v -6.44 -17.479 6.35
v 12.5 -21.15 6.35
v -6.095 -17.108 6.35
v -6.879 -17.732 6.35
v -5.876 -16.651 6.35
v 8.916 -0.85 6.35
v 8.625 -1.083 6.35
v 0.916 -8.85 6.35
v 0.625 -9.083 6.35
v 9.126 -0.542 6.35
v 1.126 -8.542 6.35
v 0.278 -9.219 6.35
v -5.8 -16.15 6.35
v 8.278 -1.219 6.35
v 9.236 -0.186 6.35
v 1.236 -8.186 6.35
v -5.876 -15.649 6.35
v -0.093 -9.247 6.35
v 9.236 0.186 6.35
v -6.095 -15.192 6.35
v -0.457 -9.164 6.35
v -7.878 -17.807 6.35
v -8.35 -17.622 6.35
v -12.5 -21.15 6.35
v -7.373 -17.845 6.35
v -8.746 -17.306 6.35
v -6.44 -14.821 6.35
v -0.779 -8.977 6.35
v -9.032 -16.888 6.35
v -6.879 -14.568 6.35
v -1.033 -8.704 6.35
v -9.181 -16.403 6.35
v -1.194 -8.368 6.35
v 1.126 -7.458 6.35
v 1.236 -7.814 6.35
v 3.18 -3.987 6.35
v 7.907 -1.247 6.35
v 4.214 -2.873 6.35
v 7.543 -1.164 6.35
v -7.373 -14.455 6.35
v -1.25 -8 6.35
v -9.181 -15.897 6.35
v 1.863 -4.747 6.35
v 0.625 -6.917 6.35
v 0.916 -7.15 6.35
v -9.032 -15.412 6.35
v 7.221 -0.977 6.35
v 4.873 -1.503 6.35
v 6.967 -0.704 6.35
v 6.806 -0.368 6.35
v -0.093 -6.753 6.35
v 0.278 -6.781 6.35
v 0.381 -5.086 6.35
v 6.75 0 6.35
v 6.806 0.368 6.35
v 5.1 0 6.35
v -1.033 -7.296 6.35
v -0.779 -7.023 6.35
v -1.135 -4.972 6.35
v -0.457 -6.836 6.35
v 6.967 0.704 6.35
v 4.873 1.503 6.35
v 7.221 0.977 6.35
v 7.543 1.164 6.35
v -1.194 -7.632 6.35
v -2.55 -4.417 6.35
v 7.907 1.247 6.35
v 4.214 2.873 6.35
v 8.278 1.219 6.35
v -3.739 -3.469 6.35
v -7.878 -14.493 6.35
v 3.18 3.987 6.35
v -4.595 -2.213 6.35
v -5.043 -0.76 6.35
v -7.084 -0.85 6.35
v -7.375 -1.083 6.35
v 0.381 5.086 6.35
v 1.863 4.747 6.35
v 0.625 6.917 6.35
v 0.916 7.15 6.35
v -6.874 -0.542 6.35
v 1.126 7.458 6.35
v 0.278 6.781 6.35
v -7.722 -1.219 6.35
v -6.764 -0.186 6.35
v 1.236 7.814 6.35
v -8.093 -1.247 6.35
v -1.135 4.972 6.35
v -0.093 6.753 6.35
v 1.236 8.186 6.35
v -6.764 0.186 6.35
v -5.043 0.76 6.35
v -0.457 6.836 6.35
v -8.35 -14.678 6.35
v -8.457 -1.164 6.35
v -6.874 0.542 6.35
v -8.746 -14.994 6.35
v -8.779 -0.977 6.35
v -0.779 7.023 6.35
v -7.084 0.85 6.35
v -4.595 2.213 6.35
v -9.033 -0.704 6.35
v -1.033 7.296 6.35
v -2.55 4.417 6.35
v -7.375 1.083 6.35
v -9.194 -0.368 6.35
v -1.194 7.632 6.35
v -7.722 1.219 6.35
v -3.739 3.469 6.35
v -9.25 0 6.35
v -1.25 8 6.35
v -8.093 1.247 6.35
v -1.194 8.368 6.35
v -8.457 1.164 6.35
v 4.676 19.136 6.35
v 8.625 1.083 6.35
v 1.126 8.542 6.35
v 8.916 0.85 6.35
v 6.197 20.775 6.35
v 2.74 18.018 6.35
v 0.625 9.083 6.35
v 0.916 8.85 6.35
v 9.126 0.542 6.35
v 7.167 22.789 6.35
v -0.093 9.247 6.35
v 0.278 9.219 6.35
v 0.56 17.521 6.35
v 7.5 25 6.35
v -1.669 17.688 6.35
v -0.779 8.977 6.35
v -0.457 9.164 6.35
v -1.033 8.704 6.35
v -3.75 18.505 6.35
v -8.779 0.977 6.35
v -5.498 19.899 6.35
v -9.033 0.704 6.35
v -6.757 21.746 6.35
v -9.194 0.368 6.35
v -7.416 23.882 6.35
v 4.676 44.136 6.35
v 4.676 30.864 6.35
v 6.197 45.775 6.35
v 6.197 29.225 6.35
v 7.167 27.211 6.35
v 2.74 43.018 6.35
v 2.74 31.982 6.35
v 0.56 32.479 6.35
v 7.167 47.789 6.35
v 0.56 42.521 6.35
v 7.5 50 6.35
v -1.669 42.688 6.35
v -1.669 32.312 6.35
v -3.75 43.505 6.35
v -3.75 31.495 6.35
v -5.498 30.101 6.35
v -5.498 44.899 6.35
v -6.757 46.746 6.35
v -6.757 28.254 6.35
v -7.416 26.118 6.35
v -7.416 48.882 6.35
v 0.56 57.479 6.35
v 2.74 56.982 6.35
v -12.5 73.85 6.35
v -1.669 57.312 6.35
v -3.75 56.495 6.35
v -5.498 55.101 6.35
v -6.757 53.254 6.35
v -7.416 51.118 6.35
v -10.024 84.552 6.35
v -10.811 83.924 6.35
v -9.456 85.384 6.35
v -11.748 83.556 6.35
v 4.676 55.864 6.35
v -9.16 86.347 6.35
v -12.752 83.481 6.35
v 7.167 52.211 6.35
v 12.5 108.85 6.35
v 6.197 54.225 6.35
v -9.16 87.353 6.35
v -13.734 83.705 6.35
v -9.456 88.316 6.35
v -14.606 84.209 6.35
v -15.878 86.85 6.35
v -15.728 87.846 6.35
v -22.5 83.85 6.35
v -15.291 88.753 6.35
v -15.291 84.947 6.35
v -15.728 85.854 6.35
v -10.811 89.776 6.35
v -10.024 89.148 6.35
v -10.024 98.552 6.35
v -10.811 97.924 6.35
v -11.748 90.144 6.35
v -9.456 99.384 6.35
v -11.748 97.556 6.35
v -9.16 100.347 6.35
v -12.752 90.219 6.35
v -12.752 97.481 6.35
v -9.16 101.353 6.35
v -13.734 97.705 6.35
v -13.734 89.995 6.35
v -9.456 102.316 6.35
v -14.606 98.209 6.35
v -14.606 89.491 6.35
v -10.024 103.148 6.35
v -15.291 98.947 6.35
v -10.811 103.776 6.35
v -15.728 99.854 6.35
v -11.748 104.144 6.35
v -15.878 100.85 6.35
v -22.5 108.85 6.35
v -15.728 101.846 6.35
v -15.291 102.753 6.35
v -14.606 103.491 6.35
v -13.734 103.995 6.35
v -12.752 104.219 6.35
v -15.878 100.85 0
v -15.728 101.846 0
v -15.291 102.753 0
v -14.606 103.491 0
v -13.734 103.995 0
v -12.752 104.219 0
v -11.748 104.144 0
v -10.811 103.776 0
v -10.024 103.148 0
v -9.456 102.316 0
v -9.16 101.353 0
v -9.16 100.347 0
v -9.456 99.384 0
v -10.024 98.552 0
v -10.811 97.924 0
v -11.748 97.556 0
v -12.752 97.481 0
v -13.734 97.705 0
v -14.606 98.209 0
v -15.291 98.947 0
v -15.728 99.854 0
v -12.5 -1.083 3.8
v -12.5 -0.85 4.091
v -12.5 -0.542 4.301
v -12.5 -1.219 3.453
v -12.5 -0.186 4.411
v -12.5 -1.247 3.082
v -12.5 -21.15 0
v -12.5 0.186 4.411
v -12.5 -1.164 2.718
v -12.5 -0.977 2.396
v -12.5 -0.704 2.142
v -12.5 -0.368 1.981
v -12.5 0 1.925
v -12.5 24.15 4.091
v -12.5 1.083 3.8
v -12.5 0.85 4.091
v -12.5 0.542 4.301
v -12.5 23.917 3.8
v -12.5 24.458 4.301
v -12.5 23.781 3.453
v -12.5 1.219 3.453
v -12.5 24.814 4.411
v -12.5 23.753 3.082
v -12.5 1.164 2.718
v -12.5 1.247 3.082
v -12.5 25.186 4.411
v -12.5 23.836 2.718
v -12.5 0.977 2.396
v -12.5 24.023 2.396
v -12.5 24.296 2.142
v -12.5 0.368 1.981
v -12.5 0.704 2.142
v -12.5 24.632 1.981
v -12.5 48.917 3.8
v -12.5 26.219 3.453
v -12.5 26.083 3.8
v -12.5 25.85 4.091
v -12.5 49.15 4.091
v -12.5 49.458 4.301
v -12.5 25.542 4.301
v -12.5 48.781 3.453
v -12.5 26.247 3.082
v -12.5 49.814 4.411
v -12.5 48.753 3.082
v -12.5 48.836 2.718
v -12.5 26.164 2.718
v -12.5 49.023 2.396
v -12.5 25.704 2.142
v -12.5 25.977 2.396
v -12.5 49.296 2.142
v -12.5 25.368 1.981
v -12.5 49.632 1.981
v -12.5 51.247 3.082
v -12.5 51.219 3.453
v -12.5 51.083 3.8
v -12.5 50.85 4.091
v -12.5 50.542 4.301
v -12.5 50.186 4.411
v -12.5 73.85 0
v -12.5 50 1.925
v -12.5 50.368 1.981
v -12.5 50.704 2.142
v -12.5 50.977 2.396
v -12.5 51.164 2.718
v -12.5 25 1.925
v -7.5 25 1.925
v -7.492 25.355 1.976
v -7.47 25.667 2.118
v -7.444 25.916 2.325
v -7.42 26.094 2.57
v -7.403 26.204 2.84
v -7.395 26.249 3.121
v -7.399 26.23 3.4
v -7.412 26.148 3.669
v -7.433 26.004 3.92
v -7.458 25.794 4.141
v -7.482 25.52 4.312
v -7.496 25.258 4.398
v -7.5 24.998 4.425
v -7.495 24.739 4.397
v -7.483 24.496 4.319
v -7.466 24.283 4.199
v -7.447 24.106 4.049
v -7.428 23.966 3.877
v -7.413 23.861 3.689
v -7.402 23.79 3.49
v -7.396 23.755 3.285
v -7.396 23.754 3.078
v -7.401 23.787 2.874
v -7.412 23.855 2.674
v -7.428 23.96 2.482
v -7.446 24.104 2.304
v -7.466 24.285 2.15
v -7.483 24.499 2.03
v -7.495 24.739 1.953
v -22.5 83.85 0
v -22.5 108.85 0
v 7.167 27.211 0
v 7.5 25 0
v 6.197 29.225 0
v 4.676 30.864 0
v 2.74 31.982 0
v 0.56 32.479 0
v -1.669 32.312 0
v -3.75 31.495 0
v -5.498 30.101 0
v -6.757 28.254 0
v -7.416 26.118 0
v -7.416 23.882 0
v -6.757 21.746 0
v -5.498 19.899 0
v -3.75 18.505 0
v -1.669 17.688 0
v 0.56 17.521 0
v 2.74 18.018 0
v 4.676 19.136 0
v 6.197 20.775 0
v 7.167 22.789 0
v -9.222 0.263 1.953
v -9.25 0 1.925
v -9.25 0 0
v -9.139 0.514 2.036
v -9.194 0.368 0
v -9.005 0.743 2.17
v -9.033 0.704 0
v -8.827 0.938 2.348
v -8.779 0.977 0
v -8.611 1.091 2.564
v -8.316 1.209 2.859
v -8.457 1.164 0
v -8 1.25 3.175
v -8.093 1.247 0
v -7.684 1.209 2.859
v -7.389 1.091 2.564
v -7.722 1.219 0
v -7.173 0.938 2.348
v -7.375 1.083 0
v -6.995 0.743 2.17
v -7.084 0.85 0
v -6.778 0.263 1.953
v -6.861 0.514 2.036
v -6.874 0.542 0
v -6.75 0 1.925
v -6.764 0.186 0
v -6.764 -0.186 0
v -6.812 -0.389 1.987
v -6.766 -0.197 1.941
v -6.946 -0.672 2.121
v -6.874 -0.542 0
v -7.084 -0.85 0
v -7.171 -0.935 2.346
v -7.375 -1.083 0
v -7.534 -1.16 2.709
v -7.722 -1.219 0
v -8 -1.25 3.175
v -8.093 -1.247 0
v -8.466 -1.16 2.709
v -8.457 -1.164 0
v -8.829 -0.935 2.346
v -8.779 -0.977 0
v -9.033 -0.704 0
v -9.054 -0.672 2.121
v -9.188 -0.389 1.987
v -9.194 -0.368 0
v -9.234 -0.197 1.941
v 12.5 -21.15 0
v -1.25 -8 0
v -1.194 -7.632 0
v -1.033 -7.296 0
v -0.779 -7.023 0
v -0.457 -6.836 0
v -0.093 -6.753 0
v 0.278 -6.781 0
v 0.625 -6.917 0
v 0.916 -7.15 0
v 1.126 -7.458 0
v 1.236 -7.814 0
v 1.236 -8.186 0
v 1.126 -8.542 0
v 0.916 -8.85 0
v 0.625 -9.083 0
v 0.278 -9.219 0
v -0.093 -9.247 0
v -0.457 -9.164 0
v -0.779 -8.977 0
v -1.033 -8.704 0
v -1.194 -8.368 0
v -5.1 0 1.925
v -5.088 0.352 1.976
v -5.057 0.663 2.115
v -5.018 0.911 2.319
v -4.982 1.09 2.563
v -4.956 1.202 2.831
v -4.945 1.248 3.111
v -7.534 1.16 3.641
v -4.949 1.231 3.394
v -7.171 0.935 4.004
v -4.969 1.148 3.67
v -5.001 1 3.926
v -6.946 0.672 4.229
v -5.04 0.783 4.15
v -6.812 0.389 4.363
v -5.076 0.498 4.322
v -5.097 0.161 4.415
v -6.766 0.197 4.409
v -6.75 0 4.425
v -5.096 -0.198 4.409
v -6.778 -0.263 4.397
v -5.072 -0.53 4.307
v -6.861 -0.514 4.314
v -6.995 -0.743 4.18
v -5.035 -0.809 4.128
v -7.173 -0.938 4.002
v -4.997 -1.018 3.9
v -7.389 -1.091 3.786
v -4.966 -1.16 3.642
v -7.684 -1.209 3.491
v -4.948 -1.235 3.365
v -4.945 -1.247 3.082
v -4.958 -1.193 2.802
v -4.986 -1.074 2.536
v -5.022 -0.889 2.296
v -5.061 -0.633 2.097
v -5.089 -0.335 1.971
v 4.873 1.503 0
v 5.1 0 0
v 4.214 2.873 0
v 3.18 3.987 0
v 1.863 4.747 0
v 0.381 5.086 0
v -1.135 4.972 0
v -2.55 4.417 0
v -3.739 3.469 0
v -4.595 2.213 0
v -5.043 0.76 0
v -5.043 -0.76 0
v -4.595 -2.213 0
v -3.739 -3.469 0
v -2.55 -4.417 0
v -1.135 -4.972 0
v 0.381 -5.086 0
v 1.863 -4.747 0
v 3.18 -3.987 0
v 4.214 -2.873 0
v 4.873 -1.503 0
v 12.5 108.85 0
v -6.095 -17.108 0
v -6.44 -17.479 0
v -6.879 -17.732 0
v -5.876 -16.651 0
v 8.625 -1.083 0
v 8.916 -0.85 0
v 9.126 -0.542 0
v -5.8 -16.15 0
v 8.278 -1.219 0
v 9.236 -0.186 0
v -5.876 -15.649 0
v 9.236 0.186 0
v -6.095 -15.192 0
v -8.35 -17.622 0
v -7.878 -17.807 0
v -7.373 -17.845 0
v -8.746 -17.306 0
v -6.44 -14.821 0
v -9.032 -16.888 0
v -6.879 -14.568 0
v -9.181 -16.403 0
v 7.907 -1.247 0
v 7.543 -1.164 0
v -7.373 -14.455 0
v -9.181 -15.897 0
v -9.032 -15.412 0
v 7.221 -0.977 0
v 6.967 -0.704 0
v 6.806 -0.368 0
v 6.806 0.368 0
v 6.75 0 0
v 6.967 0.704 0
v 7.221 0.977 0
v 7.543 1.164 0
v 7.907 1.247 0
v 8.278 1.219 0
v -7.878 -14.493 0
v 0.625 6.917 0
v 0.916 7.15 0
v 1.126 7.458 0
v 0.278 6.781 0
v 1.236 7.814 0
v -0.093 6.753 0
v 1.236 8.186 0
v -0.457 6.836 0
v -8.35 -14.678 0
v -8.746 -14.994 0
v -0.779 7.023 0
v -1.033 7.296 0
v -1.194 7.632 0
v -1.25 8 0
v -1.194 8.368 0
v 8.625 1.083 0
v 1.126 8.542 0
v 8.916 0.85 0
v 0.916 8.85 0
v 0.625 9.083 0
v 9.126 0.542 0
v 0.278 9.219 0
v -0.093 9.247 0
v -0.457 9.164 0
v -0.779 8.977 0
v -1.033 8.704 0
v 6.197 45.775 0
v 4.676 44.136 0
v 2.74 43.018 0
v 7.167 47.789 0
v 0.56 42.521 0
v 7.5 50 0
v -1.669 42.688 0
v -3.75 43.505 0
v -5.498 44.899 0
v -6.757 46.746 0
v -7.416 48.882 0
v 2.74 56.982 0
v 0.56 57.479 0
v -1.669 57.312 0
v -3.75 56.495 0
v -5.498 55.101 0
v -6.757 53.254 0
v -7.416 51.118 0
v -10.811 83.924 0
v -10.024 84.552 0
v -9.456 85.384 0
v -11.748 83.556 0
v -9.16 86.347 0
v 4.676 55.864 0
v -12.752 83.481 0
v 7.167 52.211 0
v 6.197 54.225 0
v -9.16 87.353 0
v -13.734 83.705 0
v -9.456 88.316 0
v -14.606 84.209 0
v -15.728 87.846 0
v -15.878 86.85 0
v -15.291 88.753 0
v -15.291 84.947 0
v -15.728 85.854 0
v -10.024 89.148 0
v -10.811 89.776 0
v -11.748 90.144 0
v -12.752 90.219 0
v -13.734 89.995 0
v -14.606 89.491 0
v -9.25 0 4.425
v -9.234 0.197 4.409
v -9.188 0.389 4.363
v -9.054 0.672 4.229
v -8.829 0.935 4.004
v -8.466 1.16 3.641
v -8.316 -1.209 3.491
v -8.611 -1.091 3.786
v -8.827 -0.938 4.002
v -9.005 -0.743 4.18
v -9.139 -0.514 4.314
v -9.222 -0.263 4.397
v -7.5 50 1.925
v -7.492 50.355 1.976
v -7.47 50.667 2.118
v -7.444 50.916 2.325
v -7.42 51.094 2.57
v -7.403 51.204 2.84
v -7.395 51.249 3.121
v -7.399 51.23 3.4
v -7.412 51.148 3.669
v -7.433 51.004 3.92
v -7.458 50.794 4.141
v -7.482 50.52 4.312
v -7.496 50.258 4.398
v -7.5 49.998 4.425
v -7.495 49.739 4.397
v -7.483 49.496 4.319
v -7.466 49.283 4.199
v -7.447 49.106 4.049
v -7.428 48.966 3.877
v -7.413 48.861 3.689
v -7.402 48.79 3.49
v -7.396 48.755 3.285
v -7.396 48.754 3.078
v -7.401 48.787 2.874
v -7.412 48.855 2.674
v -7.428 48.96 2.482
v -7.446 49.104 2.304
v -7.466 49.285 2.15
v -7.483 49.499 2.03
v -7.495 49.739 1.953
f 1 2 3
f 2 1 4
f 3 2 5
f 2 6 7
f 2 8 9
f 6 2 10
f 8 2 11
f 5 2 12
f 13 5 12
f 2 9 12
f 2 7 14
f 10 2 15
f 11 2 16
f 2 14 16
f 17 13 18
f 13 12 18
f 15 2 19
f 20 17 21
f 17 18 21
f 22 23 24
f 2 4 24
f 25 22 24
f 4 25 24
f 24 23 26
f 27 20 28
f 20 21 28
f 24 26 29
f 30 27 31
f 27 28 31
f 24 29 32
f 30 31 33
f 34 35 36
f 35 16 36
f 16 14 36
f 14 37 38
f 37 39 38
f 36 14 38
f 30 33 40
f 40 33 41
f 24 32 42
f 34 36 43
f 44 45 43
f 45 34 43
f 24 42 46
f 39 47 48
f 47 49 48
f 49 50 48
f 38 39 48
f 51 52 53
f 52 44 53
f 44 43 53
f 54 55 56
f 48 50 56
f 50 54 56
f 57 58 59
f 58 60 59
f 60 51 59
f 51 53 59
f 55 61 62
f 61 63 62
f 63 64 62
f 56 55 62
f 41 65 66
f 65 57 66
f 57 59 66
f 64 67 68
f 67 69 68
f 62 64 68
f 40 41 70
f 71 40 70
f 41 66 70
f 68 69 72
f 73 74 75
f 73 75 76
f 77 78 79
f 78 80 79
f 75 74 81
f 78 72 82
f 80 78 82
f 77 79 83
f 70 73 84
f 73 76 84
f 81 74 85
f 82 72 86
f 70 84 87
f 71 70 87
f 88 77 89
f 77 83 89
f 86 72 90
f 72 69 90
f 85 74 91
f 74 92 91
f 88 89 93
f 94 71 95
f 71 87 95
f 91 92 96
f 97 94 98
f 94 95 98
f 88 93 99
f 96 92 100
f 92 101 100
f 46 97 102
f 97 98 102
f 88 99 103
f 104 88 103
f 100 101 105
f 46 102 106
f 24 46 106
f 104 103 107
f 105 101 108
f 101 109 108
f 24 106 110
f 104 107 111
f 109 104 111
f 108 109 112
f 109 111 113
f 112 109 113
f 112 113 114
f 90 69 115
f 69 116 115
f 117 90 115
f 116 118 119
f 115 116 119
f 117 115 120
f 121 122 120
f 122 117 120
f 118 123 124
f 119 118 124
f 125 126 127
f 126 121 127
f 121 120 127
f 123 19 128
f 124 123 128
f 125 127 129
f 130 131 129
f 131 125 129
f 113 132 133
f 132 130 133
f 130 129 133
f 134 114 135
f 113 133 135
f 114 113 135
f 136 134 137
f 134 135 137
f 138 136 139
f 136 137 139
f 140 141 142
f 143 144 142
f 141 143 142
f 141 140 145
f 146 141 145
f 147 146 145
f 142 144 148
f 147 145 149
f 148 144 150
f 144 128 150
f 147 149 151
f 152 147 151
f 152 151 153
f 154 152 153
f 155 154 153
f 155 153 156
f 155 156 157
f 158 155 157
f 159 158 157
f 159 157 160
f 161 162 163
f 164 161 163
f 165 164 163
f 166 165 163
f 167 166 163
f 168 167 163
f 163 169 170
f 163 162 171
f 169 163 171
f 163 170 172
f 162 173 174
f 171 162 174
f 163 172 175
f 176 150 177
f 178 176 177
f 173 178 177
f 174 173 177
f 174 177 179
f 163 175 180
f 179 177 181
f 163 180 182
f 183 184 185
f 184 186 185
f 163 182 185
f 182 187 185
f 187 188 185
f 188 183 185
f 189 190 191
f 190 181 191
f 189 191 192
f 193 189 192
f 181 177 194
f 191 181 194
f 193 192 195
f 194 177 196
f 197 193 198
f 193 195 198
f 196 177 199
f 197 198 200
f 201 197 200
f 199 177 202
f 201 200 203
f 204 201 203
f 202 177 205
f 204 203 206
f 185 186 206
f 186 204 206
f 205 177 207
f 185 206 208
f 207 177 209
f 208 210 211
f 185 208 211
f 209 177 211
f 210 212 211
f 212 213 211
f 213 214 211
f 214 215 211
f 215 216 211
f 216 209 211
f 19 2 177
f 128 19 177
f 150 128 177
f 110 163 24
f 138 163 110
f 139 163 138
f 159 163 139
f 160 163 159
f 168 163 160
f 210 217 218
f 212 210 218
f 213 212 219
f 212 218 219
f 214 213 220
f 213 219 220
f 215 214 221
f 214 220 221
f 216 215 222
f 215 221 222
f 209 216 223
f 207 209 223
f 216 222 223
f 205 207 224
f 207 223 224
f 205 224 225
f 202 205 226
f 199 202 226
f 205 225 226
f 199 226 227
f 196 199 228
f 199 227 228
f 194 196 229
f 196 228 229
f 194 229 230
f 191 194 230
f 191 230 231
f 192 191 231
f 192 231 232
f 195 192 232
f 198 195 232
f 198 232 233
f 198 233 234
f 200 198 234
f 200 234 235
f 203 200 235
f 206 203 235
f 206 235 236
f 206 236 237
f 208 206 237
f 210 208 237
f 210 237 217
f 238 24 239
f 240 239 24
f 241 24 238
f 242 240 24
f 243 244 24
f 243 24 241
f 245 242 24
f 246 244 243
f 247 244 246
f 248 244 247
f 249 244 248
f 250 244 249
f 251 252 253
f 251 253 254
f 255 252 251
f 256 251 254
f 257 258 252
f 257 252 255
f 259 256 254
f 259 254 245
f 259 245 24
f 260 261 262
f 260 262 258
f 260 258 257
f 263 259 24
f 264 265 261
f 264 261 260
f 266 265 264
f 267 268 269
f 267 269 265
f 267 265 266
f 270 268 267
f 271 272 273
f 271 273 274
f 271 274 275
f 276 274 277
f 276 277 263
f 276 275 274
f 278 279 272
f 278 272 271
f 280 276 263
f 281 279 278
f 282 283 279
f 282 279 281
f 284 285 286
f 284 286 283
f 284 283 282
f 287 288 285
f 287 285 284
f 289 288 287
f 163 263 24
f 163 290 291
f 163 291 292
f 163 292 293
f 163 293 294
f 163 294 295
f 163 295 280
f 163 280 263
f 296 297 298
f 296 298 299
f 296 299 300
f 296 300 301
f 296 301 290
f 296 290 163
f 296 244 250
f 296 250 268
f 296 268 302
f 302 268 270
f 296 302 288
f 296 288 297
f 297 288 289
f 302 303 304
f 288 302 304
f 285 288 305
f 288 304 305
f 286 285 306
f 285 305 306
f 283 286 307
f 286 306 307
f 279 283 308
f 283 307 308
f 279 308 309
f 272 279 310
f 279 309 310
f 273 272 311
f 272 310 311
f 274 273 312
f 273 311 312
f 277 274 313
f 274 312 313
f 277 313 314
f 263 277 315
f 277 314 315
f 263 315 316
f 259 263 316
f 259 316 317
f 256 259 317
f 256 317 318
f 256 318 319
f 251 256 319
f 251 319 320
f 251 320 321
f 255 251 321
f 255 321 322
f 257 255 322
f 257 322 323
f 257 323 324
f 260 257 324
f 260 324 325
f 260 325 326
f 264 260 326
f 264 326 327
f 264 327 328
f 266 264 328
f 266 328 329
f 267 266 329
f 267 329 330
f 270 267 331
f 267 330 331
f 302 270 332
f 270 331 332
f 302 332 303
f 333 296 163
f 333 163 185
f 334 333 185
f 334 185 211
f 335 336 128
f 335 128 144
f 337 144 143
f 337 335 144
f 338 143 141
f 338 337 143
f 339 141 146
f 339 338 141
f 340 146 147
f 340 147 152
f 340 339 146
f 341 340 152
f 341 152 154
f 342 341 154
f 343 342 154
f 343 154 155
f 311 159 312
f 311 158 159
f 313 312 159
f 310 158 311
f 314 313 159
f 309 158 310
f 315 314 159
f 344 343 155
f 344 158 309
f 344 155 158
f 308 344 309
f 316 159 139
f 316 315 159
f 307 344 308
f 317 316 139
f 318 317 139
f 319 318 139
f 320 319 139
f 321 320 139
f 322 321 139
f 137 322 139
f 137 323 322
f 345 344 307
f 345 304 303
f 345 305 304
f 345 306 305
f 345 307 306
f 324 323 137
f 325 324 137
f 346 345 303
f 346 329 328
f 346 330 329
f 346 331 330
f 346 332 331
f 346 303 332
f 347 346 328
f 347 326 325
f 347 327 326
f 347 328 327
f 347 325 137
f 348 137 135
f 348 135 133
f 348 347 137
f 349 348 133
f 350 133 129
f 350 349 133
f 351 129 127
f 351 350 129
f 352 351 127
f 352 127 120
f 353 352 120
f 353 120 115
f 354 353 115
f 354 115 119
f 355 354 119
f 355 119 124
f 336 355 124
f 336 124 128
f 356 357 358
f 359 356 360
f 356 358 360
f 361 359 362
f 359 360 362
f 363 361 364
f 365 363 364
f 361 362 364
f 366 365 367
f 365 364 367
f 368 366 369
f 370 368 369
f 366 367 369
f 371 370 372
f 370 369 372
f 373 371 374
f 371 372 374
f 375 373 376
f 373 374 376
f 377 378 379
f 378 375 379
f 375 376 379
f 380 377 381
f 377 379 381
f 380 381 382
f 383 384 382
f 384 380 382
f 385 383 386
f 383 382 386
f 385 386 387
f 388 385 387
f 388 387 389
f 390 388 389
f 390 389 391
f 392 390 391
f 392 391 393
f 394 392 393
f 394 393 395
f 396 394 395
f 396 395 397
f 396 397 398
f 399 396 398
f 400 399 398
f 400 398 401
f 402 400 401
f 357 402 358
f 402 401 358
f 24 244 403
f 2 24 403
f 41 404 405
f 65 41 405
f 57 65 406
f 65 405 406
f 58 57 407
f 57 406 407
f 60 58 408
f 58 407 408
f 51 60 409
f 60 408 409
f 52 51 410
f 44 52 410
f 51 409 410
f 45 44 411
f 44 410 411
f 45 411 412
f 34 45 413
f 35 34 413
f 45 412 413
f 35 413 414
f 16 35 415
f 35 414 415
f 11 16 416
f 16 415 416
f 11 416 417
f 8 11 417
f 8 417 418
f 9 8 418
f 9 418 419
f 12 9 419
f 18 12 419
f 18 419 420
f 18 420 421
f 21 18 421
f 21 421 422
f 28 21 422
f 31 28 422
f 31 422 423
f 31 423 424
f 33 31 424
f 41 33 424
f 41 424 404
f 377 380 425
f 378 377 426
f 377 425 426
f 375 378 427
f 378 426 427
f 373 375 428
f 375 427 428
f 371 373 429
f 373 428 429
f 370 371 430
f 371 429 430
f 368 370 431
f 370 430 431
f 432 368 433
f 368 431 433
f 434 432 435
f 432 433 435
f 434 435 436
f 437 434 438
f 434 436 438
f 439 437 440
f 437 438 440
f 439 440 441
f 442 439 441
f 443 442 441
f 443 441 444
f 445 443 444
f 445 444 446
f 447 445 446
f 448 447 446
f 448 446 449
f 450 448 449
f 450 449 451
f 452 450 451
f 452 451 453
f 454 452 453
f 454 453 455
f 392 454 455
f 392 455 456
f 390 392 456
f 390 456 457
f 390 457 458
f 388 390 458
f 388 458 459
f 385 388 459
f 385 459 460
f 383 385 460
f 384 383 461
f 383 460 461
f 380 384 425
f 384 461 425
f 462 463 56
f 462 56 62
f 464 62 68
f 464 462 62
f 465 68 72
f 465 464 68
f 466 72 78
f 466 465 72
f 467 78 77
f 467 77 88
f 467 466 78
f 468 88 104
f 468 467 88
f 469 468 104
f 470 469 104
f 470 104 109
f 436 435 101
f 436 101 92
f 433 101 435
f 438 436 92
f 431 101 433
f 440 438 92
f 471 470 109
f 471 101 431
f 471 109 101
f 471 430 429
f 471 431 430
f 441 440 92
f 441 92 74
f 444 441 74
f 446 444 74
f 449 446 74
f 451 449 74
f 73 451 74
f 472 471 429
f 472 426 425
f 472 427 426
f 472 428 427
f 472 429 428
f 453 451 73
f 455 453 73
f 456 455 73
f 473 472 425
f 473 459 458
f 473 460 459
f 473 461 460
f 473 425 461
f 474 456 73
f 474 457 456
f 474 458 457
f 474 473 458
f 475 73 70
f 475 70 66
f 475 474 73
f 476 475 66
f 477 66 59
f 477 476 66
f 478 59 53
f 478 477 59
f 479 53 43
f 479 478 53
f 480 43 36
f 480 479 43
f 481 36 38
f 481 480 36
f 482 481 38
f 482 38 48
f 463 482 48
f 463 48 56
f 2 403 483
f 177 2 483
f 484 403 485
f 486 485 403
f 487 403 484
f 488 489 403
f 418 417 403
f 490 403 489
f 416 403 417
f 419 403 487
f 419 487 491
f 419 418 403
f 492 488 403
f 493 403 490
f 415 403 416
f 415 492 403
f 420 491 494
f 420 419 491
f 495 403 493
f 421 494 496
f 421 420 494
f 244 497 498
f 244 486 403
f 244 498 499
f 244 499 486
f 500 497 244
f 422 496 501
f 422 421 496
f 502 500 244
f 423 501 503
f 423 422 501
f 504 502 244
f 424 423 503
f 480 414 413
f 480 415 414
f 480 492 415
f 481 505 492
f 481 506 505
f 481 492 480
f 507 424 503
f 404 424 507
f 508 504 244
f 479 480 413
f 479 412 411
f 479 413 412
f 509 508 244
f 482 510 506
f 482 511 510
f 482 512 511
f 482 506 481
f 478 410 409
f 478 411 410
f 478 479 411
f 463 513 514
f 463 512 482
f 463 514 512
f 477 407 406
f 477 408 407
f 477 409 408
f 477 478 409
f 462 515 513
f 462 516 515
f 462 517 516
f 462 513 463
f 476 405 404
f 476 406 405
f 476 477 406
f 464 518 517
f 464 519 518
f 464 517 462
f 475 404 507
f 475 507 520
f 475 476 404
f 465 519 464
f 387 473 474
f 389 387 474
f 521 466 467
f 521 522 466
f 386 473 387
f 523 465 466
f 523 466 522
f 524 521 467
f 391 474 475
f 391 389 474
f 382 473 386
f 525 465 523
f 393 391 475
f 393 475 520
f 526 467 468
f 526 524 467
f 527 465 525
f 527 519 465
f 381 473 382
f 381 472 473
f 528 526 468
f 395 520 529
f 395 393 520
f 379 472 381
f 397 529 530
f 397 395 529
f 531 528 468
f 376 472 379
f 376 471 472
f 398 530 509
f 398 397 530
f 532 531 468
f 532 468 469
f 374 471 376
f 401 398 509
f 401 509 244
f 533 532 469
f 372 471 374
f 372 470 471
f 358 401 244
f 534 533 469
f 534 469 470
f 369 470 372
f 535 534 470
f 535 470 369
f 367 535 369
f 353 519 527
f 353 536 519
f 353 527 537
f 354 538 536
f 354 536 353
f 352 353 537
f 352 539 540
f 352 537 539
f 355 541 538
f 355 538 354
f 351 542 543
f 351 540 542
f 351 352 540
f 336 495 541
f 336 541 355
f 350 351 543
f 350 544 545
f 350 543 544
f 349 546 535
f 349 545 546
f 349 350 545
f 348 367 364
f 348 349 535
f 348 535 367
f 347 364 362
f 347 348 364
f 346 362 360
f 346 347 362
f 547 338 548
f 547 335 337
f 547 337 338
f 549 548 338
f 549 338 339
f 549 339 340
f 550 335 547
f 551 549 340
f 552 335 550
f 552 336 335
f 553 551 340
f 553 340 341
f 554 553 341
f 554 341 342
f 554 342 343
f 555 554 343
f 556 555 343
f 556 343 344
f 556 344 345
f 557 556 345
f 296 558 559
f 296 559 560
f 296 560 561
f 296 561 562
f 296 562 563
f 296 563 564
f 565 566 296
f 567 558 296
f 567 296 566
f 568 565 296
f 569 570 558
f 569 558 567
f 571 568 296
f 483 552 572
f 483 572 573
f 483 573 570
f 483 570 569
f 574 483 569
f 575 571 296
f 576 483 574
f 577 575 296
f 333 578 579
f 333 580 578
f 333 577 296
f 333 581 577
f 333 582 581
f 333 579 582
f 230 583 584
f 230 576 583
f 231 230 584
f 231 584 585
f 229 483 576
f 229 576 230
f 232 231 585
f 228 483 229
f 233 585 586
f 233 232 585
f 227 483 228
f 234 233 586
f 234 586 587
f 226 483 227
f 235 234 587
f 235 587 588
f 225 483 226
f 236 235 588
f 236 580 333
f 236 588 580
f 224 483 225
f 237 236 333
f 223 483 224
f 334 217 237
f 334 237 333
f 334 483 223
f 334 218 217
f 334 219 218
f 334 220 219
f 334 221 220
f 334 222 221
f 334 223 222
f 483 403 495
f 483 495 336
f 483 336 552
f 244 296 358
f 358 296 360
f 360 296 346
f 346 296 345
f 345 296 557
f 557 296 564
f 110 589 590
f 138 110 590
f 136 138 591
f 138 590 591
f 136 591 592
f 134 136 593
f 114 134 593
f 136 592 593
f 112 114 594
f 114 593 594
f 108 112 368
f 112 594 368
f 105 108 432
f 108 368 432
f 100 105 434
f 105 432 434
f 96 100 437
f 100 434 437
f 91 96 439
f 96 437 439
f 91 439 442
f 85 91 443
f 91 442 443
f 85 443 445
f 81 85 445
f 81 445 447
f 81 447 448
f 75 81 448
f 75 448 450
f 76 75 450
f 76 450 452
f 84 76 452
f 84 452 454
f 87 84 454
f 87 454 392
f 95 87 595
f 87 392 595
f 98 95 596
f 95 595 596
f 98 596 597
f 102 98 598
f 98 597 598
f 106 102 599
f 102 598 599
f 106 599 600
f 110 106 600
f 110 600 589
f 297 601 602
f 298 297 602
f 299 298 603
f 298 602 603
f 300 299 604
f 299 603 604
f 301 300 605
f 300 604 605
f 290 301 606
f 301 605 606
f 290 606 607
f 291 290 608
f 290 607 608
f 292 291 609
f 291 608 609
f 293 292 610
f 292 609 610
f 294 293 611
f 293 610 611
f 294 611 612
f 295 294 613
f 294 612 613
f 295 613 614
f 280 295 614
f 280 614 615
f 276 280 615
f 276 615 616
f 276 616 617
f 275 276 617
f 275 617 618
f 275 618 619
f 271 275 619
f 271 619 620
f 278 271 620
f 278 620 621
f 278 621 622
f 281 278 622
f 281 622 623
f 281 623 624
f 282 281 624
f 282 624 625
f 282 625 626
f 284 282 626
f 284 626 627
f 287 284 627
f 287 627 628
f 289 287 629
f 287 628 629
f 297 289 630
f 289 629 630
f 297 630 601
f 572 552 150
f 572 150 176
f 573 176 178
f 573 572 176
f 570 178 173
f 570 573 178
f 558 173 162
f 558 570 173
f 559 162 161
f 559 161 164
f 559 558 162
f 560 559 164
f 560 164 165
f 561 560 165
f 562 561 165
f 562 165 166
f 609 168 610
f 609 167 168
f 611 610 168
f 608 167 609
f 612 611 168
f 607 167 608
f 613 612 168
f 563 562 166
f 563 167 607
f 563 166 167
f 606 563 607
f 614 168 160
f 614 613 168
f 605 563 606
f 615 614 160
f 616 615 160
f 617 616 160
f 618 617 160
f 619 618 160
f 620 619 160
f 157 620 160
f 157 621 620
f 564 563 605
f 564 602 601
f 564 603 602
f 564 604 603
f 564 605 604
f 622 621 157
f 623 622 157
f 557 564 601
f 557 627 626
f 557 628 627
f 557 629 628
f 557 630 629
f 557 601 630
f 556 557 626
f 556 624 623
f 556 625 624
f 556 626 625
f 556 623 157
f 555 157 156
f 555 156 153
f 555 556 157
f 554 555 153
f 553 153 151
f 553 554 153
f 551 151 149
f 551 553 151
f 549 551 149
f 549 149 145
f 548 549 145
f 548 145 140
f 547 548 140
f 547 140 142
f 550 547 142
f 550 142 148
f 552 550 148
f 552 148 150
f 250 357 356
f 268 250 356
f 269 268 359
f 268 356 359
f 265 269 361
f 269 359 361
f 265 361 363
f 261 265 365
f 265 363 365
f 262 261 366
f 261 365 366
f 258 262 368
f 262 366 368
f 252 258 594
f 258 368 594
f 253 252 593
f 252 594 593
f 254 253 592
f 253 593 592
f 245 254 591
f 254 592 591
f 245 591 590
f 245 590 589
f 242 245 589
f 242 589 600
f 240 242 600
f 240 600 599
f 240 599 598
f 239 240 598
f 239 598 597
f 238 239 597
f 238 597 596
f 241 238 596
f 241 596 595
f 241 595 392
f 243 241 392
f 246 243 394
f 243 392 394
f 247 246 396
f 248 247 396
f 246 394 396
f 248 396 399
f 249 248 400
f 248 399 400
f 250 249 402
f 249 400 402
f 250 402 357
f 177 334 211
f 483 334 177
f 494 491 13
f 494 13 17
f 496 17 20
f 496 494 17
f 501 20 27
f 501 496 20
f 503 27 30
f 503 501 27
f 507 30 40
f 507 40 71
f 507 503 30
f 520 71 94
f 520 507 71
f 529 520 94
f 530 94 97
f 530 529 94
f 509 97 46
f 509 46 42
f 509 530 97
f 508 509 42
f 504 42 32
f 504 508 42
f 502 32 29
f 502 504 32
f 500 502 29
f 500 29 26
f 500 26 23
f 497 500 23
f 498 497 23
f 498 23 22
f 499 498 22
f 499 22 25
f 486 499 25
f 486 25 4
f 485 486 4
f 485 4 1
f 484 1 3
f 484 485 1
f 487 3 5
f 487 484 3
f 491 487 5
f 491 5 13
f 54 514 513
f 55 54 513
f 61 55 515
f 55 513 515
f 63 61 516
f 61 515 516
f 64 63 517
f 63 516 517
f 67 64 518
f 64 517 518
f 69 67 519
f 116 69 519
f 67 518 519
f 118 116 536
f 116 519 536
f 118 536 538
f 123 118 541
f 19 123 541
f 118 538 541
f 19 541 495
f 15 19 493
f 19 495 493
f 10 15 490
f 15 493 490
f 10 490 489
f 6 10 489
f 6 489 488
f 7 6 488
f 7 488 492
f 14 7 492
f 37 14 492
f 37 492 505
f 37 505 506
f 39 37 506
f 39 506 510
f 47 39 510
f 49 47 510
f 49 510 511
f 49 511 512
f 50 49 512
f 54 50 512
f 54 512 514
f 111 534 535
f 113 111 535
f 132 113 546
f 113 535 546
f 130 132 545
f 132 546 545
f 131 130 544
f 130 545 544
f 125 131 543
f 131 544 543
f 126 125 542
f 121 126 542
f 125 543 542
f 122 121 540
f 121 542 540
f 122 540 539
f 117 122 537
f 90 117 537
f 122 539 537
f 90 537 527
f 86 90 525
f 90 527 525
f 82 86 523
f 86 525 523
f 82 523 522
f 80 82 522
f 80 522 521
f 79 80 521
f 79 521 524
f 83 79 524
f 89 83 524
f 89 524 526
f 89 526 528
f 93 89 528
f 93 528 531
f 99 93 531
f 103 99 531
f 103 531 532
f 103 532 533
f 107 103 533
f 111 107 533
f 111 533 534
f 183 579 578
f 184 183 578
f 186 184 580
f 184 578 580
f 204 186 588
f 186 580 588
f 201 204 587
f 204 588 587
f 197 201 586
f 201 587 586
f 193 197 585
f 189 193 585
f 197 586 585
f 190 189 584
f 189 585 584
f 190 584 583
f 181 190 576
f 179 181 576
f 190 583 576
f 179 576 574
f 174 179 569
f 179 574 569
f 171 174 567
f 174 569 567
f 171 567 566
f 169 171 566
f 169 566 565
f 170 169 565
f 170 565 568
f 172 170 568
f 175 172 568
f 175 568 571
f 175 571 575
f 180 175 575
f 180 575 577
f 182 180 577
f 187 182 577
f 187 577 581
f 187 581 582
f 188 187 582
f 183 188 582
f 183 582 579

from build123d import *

# Parameters (mm, degrees)
SKETCH2_W                       = 25
SKETCH2_H                       = 130
SKETCH2_R                       = 5.1
SKETCH2_R_2                     = 7.5
BOSS_EXTRUDE1_DEPTH             = 6.35
TAP_DRILL_FOR_M3X0_5_TAP1_D     = 2.5
TAP_DRILL_FOR_M3X0_5_TAP1_DEPTH = 12.5
TAP_DRILL_FOR_M3X0_5_TAP1_TIP   = 0.751075774
BOSS_EXTRUDE2_DEPTH             = 6.35
F_1_4_CLEARANCE_HOLE1_D         = 6.7564
TAP_DRILL_FOR_M3X0_5_TAP2_D     = 2.5
M3_CLEARANCE_HOLE1_OUTLINE_R    = 1.7
M3_CLEARANCE_HOLE1_DEPTH        = 6.35


# Read off the part's stored shape, not the designer's step: M3 Clearance Hole1
with BuildPart() as part:
    # Sketch2 → Boss-Extrude1 (new body)
    with BuildSketch(Plane.XY):
        with Locations((0, 43.85)):
            Rectangle(SKETCH2_W, SKETCH2_H)
        Circle(SKETCH2_R, mode=Mode.SUBTRACT)
        with Locations((0, 25)):
            Circle(SKETCH2_R_2, mode=Mode.SUBTRACT)
        with Locations((0, 50)):
            Circle(SKETCH2_R_2, mode=Mode.SUBTRACT)
    extrude(amount=BOSS_EXTRUDE1_DEPTH)

    # Tap Drill for M3x0.5 Tap1
    with Locations(Plane.ZY.offset(12.5)):
        with Locations((3.175, 50), (3.175, 0), (3.175, 25)):
            Hole(TAP_DRILL_FOR_M3X0_5_TAP1_D / 2, depth=TAP_DRILL_FOR_M3X0_5_TAP1_DEPTH)
            with Locations((0, 0, -(TAP_DRILL_FOR_M3X0_5_TAP1_DEPTH + TAP_DRILL_FOR_M3X0_5_TAP1_TIP / 2))):  # 118° drill point
                Cone(0, TAP_DRILL_FOR_M3X0_5_TAP1_D / 2, TAP_DRILL_FOR_M3X0_5_TAP1_TIP, mode=Mode.SUBTRACT)

    # Sketch8 → Boss-Extrude2 (add)
    with BuildSketch(Plane(origin=(0, 0, 0), x_dir=(-1, 0, 0), z_dir=(0, 0, -1))):
        Polygon((12.5, 73.85), (22.5, 83.85), (22.5, 108.85), (12.5, 108.85), align=None)
    extrude(amount=-BOSS_EXTRUDE2_DEPTH)

    # 1/4 Clearance Hole1 (through all)
    with Locations(Plane.XY.offset(6.35)):
        with Locations((-12.5, 86.85), (-12.5, 100.85)):
            Hole(F_1_4_CLEARANCE_HOLE1_D / 2)

    # Tap Drill for M3x0.5 Tap2 (through all)
    with Locations(Plane.XY.offset(6.35)):
        with Locations((-8, 0), (0, 8), (8, 0), (0, -8)):
            Hole(TAP_DRILL_FOR_M3X0_5_TAP2_D / 2)

    # M3 Clearance Hole1 outline → M3 Clearance Hole1 (cut)
    with BuildSketch(Plane.XY):
        with Locations((-7.5, -16.15)):
            Circle(M3_CLEARANCE_HOLE1_OUTLINE_R)
    extrude(amount=M3_CLEARANCE_HOLE1_DEPTH, mode=Mode.SUBTRACT)


solid = part.part
